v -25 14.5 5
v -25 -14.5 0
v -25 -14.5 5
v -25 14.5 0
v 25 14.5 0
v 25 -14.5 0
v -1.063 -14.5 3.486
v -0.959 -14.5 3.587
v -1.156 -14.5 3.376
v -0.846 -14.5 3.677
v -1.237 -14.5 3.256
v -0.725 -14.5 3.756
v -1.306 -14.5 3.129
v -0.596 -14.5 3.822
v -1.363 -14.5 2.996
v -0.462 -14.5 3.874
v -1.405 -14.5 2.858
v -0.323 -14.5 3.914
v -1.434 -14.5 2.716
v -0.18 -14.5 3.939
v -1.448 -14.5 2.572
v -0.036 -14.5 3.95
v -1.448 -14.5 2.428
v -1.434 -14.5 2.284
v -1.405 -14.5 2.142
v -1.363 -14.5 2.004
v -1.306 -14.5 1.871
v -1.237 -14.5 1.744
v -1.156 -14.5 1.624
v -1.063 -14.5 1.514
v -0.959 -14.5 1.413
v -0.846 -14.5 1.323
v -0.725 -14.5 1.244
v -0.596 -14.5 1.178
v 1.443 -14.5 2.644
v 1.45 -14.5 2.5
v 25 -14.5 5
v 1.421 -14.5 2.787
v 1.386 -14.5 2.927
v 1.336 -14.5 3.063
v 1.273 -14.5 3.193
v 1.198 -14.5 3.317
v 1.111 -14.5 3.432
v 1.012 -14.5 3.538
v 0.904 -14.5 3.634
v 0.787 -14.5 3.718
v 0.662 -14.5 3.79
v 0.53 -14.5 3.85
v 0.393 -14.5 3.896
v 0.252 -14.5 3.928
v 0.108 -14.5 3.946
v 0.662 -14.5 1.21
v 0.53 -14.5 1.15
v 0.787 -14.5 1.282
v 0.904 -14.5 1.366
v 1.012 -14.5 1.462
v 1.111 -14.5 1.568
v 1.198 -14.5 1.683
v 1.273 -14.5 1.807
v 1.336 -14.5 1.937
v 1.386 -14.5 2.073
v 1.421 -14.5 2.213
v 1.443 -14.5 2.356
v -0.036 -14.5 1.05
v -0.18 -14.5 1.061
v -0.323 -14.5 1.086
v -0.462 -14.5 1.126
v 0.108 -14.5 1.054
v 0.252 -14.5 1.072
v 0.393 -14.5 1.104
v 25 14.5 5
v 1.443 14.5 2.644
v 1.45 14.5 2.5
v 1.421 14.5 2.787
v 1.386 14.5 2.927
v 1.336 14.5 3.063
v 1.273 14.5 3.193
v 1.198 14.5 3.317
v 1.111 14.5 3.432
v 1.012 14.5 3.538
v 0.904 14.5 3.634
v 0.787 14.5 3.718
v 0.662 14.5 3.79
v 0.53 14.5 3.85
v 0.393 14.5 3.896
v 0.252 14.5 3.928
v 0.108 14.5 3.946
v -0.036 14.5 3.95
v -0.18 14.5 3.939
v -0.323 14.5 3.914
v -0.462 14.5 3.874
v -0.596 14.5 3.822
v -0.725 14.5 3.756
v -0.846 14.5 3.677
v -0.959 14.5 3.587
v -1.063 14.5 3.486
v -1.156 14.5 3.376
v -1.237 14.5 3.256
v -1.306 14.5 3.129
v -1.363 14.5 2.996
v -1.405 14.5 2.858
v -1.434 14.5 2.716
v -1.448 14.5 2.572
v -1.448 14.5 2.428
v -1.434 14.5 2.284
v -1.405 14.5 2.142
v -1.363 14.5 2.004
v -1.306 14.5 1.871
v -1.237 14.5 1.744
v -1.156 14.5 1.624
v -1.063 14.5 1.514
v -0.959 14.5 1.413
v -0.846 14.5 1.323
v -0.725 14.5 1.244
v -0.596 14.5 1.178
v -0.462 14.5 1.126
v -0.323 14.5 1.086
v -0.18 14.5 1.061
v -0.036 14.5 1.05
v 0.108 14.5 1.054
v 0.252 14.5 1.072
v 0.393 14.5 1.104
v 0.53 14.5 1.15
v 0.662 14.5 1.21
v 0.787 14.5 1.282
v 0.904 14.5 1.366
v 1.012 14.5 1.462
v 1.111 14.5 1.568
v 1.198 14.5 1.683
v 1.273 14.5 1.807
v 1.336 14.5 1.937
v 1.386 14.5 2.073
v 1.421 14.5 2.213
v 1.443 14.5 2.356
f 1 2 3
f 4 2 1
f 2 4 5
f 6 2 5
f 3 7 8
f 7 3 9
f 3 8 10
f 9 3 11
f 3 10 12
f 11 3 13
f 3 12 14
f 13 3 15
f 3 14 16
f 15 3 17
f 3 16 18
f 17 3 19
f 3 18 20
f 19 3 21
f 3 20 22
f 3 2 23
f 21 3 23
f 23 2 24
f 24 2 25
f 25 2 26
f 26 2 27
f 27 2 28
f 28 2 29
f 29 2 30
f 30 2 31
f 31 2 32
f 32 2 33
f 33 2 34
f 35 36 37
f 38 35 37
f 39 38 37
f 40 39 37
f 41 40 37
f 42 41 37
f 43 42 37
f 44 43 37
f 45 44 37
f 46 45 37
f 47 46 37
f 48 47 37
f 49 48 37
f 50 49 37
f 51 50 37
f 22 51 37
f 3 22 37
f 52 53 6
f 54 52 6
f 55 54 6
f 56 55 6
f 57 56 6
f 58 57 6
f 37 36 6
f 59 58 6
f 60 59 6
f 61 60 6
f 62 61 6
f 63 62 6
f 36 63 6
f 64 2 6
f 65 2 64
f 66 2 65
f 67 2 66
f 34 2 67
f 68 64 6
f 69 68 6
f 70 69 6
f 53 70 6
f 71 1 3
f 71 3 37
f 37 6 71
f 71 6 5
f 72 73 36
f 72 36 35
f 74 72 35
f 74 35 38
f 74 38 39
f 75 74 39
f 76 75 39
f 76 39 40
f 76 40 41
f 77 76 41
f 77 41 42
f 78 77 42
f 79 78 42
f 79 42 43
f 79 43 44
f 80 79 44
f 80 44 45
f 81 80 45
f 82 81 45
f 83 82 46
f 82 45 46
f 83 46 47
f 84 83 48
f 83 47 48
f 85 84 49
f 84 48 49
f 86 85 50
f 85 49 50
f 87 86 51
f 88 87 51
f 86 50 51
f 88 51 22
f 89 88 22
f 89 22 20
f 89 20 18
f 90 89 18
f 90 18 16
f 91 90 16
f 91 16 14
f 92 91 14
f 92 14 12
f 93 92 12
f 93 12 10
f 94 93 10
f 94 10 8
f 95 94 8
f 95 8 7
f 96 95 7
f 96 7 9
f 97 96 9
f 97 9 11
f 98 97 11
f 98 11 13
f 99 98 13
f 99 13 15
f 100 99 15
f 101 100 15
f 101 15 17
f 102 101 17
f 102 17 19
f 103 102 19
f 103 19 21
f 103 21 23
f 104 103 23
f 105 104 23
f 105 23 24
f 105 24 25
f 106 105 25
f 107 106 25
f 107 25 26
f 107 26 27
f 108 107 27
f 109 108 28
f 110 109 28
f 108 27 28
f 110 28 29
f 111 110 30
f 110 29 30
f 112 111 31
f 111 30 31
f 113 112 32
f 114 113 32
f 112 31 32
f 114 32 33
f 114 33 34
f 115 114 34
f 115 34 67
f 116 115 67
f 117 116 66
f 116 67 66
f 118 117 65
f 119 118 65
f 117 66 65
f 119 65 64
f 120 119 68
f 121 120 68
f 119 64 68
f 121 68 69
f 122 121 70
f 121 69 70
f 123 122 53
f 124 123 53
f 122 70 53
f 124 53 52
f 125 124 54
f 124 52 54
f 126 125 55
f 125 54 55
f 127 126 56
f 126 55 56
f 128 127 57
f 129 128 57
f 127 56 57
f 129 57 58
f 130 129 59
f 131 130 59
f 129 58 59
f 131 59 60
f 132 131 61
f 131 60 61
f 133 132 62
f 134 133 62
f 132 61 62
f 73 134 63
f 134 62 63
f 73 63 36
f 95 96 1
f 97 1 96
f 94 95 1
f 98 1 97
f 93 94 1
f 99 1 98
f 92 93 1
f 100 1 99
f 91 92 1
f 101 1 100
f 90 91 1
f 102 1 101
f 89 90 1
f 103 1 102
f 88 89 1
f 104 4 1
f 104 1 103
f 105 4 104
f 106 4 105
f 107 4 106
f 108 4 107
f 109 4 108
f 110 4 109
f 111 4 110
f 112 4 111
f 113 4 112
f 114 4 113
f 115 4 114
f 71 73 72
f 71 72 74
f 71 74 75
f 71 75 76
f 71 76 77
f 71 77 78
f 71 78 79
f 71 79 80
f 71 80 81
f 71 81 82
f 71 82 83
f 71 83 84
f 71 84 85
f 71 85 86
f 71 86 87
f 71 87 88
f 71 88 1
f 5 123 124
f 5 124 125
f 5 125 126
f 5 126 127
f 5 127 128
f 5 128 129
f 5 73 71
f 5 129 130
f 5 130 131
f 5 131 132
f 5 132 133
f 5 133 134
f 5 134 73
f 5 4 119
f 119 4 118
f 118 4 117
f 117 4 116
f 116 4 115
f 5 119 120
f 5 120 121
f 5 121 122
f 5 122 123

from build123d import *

# Parameters (mm, degrees)
F0_W     = 50
F0_H     = 29
F1_DEPTH = 5
F2_R     = 1.45
F3_DEPTH = 38.6


with BuildPart() as f1:
    # F0 (on Top) → F1 (new body)
    with BuildSketch(Plane.XY):
        Rectangle(F0_W, F0_H)
    extrude(amount=F1_DEPTH)

    # F2 (on face) → F3 (cut)
    with BuildSketch(Plane.XZ.offset(14.5)):
        with Locations((0, 2.5)):
            Circle(F2_R)
    extrude(amount=-F3_DEPTH, mode=Mode.SUBTRACT)


solid = f1.part
